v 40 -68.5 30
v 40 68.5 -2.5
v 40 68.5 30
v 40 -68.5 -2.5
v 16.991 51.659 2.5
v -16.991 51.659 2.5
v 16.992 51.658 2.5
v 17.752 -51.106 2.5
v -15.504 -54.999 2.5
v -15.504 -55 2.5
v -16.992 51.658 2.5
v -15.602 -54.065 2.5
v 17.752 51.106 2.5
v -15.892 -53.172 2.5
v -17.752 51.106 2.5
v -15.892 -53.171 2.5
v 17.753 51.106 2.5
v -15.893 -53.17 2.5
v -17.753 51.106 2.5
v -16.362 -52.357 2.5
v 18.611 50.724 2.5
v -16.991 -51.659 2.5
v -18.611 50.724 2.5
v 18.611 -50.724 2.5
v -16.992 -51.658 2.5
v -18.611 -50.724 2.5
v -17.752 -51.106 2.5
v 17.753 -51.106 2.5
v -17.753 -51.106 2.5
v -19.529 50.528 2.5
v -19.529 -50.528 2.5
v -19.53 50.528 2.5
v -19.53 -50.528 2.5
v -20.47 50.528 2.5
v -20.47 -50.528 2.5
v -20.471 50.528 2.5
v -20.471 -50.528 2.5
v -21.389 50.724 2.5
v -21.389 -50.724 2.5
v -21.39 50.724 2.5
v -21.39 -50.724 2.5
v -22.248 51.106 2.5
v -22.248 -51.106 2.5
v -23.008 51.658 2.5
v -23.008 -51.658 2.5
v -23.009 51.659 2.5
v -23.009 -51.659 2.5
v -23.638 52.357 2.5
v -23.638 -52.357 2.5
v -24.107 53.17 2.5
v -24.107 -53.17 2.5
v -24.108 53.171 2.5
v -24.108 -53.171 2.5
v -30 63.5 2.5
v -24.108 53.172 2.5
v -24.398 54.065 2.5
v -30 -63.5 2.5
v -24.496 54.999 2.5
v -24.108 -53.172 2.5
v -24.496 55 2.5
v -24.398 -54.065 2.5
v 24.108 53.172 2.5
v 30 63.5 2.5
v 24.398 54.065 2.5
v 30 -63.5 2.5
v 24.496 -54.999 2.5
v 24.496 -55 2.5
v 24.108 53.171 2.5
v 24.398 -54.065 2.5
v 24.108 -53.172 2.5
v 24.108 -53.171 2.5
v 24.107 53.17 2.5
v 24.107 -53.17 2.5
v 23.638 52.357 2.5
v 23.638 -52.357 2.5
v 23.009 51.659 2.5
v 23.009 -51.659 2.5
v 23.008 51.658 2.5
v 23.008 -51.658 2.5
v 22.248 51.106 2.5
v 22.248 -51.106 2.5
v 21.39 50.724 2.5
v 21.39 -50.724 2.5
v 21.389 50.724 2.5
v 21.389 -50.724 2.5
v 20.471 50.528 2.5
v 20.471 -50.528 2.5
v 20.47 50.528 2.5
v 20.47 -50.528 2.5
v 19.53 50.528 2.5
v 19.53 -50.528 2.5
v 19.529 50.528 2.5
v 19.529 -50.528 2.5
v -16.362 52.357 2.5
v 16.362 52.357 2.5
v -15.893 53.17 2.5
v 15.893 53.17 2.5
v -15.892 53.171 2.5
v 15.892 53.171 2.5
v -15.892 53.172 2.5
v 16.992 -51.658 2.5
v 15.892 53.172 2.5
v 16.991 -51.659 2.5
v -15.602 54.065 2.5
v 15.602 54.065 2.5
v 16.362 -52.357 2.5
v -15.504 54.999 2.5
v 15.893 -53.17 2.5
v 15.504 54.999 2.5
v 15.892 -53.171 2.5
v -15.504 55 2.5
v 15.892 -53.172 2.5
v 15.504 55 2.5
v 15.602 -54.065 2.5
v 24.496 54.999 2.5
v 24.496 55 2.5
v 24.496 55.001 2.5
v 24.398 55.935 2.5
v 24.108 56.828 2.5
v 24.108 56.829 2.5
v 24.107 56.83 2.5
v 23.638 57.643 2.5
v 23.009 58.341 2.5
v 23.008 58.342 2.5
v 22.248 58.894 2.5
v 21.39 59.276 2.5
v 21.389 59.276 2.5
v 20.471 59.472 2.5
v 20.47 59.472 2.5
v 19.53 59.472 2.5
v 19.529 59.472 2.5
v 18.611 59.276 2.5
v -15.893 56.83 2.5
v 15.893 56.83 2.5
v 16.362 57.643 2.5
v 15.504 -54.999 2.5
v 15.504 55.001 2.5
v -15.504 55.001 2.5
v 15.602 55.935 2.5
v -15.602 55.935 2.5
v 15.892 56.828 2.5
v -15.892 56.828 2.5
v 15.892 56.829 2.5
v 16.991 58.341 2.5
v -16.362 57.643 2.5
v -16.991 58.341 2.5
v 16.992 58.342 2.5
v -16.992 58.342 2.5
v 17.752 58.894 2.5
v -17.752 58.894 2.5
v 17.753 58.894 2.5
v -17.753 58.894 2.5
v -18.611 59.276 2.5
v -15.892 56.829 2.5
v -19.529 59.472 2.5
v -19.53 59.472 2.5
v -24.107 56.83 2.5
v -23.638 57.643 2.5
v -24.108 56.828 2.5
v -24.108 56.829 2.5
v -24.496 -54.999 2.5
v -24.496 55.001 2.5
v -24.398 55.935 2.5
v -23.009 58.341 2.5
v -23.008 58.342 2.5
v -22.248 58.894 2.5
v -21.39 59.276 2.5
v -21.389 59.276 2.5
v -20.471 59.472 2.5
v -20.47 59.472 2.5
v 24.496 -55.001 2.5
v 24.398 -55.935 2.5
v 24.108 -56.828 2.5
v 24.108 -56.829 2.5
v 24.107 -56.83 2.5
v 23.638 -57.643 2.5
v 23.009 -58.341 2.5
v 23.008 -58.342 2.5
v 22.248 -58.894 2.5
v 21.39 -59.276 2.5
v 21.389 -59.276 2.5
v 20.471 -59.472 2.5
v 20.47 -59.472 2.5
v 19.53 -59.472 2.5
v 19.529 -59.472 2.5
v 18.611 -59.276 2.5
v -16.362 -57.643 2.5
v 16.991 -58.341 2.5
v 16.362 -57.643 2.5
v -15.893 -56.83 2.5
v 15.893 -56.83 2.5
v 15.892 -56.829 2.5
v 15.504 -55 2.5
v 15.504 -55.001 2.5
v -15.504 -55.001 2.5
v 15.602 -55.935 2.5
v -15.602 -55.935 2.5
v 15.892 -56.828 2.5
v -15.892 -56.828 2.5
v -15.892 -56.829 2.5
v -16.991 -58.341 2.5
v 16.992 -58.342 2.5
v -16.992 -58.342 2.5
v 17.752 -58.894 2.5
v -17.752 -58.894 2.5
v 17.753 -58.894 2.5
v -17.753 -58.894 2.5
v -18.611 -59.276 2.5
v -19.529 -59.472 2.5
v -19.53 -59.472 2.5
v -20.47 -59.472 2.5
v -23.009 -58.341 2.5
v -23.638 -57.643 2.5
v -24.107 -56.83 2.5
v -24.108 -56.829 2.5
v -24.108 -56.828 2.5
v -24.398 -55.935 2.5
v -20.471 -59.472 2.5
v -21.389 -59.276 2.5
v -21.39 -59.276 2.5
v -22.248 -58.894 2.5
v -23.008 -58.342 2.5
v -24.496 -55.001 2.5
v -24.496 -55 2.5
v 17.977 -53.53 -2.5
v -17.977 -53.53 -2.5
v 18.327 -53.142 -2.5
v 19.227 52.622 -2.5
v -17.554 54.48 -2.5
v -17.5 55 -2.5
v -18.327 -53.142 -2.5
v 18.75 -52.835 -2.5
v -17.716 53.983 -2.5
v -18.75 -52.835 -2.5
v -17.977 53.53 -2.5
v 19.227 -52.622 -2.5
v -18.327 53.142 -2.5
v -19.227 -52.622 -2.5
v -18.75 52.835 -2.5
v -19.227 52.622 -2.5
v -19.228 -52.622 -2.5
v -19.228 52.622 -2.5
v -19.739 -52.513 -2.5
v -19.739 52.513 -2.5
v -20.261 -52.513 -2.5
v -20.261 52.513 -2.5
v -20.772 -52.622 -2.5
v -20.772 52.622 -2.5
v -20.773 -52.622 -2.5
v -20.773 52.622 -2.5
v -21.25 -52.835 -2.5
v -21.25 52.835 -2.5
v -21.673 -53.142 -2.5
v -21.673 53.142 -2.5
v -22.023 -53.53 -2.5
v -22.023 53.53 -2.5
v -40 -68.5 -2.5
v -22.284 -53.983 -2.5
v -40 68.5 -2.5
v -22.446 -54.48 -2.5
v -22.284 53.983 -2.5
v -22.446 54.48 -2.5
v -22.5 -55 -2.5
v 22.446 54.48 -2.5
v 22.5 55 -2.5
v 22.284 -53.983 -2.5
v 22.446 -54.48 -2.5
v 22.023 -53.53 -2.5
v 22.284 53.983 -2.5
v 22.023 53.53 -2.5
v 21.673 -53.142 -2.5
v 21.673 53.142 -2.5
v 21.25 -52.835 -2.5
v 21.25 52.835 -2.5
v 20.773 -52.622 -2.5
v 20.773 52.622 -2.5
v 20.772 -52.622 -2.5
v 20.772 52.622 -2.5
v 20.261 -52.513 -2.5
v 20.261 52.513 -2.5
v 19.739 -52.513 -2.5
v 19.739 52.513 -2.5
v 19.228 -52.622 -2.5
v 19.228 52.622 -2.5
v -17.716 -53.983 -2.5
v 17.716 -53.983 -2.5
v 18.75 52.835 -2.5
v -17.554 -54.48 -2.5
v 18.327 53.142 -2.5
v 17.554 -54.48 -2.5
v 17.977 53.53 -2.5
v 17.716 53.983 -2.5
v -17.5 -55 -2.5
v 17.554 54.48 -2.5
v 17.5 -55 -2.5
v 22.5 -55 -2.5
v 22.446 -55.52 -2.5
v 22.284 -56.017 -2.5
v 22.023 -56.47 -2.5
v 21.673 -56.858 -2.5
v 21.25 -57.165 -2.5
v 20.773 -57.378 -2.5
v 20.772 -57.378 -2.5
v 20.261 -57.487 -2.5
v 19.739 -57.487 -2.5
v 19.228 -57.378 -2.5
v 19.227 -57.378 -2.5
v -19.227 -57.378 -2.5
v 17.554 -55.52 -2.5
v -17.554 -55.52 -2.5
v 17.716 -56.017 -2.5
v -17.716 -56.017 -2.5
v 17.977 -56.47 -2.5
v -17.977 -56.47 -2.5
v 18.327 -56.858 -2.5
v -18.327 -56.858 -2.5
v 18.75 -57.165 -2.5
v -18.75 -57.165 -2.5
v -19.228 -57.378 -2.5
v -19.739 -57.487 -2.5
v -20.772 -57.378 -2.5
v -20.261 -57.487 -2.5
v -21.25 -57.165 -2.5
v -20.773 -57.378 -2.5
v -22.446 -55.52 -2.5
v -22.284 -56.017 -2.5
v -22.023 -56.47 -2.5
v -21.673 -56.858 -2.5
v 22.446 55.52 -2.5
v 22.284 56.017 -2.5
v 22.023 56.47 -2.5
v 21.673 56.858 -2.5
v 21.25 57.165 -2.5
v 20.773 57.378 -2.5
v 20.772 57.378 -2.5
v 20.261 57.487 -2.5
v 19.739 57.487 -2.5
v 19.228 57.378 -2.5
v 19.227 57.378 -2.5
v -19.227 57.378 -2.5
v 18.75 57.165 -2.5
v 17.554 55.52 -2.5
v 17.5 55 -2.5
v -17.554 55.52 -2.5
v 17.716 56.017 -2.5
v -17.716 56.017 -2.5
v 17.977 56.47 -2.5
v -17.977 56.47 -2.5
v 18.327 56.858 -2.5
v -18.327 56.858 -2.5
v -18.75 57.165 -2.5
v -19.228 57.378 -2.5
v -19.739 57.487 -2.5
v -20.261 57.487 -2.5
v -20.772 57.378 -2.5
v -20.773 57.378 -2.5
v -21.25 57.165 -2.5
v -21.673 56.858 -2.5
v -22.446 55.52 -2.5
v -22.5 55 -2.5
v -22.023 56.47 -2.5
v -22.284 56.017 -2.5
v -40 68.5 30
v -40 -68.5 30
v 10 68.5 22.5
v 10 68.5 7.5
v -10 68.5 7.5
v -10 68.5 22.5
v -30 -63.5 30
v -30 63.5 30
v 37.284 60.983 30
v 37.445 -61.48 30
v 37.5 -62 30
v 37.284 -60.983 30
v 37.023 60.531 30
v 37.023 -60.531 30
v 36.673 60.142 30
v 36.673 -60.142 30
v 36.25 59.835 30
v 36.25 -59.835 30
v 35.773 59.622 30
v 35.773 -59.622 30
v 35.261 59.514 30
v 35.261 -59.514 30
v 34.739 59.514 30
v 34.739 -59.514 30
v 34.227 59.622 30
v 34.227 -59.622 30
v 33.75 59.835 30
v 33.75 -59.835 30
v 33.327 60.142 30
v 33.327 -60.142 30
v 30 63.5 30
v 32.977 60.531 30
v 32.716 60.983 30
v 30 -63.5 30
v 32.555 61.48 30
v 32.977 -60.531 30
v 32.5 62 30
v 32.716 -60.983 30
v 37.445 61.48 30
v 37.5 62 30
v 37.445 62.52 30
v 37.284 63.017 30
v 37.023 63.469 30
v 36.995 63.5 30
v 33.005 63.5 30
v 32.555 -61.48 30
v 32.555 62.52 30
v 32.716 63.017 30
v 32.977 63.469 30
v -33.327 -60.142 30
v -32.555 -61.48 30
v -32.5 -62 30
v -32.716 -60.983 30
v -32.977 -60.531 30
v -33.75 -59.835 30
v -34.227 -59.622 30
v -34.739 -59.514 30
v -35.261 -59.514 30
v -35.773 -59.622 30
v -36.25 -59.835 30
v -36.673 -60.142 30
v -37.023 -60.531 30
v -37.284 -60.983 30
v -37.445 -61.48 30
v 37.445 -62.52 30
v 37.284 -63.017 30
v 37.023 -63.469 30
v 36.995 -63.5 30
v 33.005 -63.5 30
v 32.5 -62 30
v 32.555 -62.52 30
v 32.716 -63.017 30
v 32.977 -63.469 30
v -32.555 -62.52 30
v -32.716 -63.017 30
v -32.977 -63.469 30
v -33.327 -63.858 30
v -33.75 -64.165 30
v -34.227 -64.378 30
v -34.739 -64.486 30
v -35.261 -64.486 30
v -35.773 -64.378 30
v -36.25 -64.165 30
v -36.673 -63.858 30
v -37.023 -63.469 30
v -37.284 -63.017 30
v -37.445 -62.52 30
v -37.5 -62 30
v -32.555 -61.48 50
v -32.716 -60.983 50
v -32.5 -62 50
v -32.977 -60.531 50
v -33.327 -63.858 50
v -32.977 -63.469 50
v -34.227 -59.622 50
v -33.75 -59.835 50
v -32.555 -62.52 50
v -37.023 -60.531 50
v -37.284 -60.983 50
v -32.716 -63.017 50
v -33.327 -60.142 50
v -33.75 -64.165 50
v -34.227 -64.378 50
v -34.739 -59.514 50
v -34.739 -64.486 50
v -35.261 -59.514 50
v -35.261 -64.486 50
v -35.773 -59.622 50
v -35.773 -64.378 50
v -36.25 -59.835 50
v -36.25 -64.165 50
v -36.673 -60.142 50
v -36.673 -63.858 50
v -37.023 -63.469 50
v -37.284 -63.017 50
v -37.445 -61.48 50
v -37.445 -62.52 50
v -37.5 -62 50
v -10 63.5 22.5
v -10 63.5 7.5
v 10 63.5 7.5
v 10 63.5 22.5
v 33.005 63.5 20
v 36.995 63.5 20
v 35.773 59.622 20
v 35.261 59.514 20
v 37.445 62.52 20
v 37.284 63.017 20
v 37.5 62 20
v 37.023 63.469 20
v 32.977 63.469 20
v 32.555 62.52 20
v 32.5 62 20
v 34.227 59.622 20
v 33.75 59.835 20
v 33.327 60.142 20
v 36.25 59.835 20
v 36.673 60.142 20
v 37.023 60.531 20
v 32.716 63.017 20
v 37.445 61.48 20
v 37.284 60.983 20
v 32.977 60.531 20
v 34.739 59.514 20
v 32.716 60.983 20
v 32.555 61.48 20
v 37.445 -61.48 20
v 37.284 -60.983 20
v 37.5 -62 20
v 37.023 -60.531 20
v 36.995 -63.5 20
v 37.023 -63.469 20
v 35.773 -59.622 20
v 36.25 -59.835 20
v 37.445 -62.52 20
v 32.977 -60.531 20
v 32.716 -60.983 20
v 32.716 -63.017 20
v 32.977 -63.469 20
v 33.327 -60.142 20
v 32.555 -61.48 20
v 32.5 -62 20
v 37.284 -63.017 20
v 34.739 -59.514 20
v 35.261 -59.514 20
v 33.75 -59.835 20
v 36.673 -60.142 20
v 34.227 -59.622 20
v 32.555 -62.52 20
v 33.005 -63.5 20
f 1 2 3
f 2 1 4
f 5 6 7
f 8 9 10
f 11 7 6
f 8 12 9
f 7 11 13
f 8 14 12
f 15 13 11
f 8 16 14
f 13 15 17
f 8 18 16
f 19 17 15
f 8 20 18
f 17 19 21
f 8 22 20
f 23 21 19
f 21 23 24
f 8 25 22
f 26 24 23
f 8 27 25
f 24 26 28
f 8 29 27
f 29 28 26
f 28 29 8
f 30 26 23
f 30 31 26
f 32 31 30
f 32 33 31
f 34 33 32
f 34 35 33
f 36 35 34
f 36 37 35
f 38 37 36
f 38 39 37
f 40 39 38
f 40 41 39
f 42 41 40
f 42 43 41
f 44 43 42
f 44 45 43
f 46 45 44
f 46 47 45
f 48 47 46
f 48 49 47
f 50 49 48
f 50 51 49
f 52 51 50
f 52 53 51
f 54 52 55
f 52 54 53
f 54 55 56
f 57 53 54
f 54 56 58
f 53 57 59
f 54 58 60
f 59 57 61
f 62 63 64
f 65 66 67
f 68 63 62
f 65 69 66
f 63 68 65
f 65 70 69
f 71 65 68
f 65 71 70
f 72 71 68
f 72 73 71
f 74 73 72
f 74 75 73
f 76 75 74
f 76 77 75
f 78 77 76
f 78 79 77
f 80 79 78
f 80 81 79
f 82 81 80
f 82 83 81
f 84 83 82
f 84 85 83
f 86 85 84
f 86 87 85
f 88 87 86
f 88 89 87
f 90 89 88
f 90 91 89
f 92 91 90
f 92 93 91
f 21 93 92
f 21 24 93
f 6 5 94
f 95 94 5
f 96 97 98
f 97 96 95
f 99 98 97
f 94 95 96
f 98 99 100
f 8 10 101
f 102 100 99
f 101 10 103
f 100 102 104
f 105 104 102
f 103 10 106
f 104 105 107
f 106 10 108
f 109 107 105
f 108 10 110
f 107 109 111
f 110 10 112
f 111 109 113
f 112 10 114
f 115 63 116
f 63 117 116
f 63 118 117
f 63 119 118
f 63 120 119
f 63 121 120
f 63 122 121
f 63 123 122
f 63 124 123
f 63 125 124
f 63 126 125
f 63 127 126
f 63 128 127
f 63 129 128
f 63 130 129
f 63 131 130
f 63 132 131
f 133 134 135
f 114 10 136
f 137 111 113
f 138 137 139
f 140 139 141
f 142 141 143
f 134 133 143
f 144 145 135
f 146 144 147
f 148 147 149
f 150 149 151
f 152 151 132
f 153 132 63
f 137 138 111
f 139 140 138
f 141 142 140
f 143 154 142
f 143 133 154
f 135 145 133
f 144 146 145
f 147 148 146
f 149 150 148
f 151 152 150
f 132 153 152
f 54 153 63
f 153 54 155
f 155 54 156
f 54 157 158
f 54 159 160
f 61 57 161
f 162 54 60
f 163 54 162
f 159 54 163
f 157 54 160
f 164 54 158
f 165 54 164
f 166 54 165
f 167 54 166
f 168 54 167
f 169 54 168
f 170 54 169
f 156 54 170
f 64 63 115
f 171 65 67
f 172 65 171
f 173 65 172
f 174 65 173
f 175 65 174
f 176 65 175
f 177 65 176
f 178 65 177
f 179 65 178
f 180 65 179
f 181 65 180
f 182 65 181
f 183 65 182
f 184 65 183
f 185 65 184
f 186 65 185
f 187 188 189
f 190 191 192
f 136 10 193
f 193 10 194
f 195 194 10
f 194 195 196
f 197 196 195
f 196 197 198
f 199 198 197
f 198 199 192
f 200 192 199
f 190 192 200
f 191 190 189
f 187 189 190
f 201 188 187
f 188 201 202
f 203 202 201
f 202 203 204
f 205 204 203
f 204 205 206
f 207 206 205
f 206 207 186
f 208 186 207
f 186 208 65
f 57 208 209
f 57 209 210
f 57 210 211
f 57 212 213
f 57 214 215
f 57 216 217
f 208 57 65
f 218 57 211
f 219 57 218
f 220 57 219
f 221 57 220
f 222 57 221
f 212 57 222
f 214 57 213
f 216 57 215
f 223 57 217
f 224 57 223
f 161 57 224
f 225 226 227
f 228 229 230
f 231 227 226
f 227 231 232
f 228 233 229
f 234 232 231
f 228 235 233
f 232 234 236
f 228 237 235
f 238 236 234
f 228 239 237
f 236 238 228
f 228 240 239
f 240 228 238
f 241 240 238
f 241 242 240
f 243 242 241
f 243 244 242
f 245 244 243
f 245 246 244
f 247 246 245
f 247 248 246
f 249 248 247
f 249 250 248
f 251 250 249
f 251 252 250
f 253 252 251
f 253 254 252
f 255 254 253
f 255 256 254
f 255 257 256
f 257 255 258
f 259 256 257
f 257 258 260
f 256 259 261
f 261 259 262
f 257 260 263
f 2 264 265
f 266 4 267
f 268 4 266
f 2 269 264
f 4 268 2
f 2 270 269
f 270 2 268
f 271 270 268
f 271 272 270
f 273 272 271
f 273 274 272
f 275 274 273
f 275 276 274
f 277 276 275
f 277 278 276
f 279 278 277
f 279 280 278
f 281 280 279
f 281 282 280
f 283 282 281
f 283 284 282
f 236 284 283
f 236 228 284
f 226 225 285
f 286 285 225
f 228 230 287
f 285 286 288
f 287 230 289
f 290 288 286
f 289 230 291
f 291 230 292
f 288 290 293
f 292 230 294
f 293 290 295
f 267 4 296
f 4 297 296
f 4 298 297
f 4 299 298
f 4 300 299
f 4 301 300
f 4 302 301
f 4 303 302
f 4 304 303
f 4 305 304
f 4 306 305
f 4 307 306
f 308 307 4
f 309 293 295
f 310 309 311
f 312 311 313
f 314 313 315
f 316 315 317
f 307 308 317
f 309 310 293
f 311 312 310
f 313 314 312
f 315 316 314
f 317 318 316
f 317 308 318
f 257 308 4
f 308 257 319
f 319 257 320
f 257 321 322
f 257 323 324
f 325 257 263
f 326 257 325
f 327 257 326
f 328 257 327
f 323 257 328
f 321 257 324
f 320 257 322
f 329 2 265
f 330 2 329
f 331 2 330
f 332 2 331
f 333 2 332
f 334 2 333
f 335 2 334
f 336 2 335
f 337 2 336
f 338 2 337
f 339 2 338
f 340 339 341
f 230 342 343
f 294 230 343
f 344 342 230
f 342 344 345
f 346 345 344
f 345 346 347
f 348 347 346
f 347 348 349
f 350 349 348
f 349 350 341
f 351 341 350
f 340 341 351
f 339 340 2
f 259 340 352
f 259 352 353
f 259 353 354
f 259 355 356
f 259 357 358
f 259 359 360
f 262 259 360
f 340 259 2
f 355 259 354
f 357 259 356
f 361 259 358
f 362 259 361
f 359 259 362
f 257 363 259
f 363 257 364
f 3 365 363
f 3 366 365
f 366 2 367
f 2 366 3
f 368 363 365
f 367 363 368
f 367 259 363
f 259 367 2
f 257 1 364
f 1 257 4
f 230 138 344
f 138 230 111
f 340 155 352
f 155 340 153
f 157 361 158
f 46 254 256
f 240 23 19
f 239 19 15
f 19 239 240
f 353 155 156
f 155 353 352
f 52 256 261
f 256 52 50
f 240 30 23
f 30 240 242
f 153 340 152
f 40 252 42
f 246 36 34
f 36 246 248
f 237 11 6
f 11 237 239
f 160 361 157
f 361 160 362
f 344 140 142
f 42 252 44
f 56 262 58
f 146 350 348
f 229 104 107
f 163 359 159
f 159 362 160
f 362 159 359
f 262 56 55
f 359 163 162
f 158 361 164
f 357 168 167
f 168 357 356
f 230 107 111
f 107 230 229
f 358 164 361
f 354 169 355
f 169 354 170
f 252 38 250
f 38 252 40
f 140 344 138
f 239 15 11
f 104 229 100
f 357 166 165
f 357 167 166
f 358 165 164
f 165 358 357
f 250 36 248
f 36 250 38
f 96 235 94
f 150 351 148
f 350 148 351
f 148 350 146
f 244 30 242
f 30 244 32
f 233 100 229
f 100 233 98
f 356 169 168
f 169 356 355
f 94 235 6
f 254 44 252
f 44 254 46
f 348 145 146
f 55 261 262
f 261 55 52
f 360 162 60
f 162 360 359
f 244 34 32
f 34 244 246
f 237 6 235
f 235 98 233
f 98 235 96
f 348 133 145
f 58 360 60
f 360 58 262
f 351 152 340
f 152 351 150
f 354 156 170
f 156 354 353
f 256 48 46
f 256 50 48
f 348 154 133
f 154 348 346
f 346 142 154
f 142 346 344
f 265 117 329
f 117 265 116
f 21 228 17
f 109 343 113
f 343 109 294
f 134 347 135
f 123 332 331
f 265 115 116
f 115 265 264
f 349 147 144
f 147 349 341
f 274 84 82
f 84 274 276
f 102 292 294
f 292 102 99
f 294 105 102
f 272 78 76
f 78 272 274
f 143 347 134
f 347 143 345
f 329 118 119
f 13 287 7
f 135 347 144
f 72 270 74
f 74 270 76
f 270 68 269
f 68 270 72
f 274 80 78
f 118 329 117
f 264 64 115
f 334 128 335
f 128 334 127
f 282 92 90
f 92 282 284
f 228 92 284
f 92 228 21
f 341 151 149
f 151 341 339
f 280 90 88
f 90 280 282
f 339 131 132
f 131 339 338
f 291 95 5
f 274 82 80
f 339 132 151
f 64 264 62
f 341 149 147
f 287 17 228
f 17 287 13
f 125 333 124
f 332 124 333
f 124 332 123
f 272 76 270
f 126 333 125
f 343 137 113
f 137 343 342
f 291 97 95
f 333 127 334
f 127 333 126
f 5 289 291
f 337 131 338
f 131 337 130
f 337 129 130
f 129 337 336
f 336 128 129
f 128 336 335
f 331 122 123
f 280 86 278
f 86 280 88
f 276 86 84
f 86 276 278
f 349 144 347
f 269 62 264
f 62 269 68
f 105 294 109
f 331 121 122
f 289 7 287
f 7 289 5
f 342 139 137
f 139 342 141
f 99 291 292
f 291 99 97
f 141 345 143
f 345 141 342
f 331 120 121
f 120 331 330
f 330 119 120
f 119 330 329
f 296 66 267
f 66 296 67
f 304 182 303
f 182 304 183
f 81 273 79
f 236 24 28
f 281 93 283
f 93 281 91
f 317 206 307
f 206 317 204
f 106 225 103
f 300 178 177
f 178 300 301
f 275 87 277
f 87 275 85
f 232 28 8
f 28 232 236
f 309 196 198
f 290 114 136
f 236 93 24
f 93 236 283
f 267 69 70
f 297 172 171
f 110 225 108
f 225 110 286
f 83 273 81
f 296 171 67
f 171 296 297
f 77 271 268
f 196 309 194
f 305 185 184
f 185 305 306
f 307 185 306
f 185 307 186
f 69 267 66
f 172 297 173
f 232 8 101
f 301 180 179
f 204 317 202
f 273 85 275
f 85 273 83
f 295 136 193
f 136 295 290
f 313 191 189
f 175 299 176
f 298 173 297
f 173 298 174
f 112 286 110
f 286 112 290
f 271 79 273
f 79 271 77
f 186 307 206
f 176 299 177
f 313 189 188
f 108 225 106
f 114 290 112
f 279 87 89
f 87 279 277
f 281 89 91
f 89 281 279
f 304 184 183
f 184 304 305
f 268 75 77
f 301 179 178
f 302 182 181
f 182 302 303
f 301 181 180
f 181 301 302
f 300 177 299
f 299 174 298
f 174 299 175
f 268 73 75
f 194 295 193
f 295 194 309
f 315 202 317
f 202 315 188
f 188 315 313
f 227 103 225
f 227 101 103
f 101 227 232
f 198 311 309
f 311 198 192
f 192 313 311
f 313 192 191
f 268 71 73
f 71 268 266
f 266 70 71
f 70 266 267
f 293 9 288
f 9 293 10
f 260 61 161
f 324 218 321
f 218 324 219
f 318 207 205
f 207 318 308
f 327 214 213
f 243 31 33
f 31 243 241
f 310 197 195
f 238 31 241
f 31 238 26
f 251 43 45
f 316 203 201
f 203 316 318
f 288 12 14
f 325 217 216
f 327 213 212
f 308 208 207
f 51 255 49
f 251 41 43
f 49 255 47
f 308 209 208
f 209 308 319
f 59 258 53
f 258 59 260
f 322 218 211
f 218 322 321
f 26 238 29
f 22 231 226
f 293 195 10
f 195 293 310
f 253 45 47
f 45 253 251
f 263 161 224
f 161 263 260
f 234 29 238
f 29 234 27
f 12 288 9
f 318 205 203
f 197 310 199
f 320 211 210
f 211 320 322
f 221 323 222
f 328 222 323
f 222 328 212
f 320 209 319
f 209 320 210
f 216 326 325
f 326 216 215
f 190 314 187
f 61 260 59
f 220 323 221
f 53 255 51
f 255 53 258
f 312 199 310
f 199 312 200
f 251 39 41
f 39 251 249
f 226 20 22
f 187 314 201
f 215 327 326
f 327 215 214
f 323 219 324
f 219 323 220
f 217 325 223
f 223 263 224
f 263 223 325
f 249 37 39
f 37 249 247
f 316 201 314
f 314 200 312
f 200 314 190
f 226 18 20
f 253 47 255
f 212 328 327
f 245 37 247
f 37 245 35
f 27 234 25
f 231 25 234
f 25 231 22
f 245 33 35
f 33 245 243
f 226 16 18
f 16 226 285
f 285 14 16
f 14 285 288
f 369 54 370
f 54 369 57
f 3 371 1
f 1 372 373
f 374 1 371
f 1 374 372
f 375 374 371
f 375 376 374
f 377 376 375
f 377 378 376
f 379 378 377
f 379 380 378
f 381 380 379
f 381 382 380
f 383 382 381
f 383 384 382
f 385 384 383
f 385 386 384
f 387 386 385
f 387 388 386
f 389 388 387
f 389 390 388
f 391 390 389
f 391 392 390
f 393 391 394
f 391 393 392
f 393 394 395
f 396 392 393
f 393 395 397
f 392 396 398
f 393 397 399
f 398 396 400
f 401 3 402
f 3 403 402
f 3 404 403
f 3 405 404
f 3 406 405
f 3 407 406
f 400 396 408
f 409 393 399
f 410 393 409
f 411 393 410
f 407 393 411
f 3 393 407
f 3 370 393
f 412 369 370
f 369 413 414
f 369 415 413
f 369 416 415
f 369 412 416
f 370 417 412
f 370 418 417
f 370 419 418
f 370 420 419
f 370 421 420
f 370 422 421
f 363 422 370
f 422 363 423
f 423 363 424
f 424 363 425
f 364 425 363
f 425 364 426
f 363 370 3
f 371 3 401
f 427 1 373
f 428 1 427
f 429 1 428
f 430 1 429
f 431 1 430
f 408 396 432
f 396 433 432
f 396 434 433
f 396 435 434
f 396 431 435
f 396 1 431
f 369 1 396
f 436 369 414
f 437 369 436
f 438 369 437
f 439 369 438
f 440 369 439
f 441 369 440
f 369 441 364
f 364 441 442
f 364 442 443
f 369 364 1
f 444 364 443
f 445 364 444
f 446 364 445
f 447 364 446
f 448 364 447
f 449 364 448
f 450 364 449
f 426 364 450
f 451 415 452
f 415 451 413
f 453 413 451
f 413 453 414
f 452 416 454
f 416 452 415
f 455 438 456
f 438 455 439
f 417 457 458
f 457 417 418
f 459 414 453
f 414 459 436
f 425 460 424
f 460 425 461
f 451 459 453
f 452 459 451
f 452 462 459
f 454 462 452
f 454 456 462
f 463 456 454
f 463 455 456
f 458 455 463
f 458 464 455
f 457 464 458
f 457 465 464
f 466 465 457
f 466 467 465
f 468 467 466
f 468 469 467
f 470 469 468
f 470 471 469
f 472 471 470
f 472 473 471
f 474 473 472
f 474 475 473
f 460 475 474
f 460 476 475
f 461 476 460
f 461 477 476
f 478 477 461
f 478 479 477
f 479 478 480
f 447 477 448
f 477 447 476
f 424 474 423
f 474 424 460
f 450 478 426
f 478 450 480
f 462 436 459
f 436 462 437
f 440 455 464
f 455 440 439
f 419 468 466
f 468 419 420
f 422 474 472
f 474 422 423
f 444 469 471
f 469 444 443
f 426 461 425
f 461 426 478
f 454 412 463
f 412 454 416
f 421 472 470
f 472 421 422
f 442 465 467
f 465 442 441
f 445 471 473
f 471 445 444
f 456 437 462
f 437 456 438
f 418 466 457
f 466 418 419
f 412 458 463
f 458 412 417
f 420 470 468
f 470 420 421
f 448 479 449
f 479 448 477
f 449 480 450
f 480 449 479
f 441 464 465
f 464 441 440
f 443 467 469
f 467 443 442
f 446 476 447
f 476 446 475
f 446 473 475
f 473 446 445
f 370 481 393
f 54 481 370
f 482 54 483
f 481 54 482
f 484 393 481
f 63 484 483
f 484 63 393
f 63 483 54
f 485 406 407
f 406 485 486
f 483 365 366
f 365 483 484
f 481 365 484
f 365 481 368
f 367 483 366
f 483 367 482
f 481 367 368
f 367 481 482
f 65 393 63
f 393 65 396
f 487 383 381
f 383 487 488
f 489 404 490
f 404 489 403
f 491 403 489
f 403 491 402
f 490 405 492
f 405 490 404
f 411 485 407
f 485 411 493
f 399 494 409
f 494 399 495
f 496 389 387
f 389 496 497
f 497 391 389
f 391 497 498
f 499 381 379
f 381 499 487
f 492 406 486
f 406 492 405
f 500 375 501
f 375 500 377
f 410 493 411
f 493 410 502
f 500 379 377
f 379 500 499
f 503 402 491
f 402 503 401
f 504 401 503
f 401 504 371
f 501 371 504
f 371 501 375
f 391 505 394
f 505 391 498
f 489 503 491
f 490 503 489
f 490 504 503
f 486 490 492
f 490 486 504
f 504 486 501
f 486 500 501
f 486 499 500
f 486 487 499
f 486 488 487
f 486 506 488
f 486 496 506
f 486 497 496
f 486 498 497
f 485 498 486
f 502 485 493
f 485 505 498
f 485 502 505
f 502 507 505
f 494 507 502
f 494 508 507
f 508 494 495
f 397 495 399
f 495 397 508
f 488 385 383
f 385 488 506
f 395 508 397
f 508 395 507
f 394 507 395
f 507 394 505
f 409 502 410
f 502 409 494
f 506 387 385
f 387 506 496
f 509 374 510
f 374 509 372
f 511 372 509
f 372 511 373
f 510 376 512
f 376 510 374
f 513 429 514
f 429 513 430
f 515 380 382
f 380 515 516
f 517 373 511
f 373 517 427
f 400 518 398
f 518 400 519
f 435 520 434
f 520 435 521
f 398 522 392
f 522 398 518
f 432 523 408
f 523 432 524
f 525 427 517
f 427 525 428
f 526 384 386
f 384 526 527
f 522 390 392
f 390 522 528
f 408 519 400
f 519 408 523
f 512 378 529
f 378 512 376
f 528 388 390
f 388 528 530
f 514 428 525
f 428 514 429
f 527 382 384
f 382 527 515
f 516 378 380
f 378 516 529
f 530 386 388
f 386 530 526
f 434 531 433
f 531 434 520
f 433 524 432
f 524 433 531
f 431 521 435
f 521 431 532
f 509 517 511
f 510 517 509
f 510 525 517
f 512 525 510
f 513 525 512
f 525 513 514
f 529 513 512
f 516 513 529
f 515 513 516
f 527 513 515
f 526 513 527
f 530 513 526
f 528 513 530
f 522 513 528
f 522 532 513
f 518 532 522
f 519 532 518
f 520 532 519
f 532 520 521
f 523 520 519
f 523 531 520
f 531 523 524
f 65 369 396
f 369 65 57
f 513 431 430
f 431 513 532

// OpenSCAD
// Easy Mote is 60x127.
// Security screws are button head T25 M5x20.
// Screws to attach to wall are Tapcon concrete anchors 3/16" x 1-1/4".

// Minimum fragment size (smooths the screw holes)
$fs = 0.15;

// outer dimensions
box_w = 80;
box_l = 137;
box_h = 30;

// thicknesses
floor_t = 5;
side_t = 10;
top_bottom_t = 5;

// security screws to attach cover
thread_radius = 2.5;

// floor with screw holes
difference() {
    // floor
    color([1, 0, 0])
    cube([box_w, box_l, floor_t], true);
    // upper-left hole
    translate([-20, 55, -floor_t/2 - .001])
        cylinder(h=floor_t + .01, r1=2.5, r2=4.5);
    // upper-right hole
    translate([20, 55, -floor_t/2 - .001])
        cylinder(h=floor_t + .01, r1=2.5, r2=4.5);
    // lower-right hole
    translate([20, -55, -floor_t/2 - .001])
        cylinder(h=floor_t + .01, r1=2.5, r2=4.5);
    // lower-left hole
    translate([-20, -55, -floor_t/2 - .001])
        cylinder(h=floor_t + .01, r1=2.5, r2=4.5);
}

// left wall with screw holes (y position of holes is -lid_l/2 + 12 or lid_l/2 - 12)
translate([-box_w / 2 + (side_t / 2), 0, box_h/2]) {
    union() {
        cube([side_t, box_l, box_h], true);
        translate([0, 62, 0]) 
            color([0,0,0])
            cylinder(h=1, r=thread_radius);
        translate([0, -62, (floor_t + box_h - 30)]) 
            cylinder(h=30, r=thread_radius);
    }
}

// top wall 5 thick with IR hole
color([0,0,1])
translate([0, box_l/2 - (top_bottom_t / 2), box_h/2]) {
    difference() {
        // wall 
        cube([box_w, top_bottom_t, box_h], true);
        
        // hole
        cube([20, top_bottom_t + 0.01, 15], true);
    }
}

// right wall with screw holes
color([0,1,0])
translate([box_w / 2 - (side_t /2), 0, box_h/2 ]) {
    difference() {
        cube([side_t, box_l, box_h], true);
        translate([0, 62, (floor_t + box_h - 30)])
            cylinder(h=30, r=thread_radius);
        translate([0, -62, (floor_t + box_h - 30)])
            cylinder(h=30, r=thread_radius);
    }
}

// bottom wall
color([0,0,1])
translate([0, -box_l/2 + (top_bottom_t / 2), box_h/2]) {
    cube([box_w, top_bottom_t, box_h], true);
}
